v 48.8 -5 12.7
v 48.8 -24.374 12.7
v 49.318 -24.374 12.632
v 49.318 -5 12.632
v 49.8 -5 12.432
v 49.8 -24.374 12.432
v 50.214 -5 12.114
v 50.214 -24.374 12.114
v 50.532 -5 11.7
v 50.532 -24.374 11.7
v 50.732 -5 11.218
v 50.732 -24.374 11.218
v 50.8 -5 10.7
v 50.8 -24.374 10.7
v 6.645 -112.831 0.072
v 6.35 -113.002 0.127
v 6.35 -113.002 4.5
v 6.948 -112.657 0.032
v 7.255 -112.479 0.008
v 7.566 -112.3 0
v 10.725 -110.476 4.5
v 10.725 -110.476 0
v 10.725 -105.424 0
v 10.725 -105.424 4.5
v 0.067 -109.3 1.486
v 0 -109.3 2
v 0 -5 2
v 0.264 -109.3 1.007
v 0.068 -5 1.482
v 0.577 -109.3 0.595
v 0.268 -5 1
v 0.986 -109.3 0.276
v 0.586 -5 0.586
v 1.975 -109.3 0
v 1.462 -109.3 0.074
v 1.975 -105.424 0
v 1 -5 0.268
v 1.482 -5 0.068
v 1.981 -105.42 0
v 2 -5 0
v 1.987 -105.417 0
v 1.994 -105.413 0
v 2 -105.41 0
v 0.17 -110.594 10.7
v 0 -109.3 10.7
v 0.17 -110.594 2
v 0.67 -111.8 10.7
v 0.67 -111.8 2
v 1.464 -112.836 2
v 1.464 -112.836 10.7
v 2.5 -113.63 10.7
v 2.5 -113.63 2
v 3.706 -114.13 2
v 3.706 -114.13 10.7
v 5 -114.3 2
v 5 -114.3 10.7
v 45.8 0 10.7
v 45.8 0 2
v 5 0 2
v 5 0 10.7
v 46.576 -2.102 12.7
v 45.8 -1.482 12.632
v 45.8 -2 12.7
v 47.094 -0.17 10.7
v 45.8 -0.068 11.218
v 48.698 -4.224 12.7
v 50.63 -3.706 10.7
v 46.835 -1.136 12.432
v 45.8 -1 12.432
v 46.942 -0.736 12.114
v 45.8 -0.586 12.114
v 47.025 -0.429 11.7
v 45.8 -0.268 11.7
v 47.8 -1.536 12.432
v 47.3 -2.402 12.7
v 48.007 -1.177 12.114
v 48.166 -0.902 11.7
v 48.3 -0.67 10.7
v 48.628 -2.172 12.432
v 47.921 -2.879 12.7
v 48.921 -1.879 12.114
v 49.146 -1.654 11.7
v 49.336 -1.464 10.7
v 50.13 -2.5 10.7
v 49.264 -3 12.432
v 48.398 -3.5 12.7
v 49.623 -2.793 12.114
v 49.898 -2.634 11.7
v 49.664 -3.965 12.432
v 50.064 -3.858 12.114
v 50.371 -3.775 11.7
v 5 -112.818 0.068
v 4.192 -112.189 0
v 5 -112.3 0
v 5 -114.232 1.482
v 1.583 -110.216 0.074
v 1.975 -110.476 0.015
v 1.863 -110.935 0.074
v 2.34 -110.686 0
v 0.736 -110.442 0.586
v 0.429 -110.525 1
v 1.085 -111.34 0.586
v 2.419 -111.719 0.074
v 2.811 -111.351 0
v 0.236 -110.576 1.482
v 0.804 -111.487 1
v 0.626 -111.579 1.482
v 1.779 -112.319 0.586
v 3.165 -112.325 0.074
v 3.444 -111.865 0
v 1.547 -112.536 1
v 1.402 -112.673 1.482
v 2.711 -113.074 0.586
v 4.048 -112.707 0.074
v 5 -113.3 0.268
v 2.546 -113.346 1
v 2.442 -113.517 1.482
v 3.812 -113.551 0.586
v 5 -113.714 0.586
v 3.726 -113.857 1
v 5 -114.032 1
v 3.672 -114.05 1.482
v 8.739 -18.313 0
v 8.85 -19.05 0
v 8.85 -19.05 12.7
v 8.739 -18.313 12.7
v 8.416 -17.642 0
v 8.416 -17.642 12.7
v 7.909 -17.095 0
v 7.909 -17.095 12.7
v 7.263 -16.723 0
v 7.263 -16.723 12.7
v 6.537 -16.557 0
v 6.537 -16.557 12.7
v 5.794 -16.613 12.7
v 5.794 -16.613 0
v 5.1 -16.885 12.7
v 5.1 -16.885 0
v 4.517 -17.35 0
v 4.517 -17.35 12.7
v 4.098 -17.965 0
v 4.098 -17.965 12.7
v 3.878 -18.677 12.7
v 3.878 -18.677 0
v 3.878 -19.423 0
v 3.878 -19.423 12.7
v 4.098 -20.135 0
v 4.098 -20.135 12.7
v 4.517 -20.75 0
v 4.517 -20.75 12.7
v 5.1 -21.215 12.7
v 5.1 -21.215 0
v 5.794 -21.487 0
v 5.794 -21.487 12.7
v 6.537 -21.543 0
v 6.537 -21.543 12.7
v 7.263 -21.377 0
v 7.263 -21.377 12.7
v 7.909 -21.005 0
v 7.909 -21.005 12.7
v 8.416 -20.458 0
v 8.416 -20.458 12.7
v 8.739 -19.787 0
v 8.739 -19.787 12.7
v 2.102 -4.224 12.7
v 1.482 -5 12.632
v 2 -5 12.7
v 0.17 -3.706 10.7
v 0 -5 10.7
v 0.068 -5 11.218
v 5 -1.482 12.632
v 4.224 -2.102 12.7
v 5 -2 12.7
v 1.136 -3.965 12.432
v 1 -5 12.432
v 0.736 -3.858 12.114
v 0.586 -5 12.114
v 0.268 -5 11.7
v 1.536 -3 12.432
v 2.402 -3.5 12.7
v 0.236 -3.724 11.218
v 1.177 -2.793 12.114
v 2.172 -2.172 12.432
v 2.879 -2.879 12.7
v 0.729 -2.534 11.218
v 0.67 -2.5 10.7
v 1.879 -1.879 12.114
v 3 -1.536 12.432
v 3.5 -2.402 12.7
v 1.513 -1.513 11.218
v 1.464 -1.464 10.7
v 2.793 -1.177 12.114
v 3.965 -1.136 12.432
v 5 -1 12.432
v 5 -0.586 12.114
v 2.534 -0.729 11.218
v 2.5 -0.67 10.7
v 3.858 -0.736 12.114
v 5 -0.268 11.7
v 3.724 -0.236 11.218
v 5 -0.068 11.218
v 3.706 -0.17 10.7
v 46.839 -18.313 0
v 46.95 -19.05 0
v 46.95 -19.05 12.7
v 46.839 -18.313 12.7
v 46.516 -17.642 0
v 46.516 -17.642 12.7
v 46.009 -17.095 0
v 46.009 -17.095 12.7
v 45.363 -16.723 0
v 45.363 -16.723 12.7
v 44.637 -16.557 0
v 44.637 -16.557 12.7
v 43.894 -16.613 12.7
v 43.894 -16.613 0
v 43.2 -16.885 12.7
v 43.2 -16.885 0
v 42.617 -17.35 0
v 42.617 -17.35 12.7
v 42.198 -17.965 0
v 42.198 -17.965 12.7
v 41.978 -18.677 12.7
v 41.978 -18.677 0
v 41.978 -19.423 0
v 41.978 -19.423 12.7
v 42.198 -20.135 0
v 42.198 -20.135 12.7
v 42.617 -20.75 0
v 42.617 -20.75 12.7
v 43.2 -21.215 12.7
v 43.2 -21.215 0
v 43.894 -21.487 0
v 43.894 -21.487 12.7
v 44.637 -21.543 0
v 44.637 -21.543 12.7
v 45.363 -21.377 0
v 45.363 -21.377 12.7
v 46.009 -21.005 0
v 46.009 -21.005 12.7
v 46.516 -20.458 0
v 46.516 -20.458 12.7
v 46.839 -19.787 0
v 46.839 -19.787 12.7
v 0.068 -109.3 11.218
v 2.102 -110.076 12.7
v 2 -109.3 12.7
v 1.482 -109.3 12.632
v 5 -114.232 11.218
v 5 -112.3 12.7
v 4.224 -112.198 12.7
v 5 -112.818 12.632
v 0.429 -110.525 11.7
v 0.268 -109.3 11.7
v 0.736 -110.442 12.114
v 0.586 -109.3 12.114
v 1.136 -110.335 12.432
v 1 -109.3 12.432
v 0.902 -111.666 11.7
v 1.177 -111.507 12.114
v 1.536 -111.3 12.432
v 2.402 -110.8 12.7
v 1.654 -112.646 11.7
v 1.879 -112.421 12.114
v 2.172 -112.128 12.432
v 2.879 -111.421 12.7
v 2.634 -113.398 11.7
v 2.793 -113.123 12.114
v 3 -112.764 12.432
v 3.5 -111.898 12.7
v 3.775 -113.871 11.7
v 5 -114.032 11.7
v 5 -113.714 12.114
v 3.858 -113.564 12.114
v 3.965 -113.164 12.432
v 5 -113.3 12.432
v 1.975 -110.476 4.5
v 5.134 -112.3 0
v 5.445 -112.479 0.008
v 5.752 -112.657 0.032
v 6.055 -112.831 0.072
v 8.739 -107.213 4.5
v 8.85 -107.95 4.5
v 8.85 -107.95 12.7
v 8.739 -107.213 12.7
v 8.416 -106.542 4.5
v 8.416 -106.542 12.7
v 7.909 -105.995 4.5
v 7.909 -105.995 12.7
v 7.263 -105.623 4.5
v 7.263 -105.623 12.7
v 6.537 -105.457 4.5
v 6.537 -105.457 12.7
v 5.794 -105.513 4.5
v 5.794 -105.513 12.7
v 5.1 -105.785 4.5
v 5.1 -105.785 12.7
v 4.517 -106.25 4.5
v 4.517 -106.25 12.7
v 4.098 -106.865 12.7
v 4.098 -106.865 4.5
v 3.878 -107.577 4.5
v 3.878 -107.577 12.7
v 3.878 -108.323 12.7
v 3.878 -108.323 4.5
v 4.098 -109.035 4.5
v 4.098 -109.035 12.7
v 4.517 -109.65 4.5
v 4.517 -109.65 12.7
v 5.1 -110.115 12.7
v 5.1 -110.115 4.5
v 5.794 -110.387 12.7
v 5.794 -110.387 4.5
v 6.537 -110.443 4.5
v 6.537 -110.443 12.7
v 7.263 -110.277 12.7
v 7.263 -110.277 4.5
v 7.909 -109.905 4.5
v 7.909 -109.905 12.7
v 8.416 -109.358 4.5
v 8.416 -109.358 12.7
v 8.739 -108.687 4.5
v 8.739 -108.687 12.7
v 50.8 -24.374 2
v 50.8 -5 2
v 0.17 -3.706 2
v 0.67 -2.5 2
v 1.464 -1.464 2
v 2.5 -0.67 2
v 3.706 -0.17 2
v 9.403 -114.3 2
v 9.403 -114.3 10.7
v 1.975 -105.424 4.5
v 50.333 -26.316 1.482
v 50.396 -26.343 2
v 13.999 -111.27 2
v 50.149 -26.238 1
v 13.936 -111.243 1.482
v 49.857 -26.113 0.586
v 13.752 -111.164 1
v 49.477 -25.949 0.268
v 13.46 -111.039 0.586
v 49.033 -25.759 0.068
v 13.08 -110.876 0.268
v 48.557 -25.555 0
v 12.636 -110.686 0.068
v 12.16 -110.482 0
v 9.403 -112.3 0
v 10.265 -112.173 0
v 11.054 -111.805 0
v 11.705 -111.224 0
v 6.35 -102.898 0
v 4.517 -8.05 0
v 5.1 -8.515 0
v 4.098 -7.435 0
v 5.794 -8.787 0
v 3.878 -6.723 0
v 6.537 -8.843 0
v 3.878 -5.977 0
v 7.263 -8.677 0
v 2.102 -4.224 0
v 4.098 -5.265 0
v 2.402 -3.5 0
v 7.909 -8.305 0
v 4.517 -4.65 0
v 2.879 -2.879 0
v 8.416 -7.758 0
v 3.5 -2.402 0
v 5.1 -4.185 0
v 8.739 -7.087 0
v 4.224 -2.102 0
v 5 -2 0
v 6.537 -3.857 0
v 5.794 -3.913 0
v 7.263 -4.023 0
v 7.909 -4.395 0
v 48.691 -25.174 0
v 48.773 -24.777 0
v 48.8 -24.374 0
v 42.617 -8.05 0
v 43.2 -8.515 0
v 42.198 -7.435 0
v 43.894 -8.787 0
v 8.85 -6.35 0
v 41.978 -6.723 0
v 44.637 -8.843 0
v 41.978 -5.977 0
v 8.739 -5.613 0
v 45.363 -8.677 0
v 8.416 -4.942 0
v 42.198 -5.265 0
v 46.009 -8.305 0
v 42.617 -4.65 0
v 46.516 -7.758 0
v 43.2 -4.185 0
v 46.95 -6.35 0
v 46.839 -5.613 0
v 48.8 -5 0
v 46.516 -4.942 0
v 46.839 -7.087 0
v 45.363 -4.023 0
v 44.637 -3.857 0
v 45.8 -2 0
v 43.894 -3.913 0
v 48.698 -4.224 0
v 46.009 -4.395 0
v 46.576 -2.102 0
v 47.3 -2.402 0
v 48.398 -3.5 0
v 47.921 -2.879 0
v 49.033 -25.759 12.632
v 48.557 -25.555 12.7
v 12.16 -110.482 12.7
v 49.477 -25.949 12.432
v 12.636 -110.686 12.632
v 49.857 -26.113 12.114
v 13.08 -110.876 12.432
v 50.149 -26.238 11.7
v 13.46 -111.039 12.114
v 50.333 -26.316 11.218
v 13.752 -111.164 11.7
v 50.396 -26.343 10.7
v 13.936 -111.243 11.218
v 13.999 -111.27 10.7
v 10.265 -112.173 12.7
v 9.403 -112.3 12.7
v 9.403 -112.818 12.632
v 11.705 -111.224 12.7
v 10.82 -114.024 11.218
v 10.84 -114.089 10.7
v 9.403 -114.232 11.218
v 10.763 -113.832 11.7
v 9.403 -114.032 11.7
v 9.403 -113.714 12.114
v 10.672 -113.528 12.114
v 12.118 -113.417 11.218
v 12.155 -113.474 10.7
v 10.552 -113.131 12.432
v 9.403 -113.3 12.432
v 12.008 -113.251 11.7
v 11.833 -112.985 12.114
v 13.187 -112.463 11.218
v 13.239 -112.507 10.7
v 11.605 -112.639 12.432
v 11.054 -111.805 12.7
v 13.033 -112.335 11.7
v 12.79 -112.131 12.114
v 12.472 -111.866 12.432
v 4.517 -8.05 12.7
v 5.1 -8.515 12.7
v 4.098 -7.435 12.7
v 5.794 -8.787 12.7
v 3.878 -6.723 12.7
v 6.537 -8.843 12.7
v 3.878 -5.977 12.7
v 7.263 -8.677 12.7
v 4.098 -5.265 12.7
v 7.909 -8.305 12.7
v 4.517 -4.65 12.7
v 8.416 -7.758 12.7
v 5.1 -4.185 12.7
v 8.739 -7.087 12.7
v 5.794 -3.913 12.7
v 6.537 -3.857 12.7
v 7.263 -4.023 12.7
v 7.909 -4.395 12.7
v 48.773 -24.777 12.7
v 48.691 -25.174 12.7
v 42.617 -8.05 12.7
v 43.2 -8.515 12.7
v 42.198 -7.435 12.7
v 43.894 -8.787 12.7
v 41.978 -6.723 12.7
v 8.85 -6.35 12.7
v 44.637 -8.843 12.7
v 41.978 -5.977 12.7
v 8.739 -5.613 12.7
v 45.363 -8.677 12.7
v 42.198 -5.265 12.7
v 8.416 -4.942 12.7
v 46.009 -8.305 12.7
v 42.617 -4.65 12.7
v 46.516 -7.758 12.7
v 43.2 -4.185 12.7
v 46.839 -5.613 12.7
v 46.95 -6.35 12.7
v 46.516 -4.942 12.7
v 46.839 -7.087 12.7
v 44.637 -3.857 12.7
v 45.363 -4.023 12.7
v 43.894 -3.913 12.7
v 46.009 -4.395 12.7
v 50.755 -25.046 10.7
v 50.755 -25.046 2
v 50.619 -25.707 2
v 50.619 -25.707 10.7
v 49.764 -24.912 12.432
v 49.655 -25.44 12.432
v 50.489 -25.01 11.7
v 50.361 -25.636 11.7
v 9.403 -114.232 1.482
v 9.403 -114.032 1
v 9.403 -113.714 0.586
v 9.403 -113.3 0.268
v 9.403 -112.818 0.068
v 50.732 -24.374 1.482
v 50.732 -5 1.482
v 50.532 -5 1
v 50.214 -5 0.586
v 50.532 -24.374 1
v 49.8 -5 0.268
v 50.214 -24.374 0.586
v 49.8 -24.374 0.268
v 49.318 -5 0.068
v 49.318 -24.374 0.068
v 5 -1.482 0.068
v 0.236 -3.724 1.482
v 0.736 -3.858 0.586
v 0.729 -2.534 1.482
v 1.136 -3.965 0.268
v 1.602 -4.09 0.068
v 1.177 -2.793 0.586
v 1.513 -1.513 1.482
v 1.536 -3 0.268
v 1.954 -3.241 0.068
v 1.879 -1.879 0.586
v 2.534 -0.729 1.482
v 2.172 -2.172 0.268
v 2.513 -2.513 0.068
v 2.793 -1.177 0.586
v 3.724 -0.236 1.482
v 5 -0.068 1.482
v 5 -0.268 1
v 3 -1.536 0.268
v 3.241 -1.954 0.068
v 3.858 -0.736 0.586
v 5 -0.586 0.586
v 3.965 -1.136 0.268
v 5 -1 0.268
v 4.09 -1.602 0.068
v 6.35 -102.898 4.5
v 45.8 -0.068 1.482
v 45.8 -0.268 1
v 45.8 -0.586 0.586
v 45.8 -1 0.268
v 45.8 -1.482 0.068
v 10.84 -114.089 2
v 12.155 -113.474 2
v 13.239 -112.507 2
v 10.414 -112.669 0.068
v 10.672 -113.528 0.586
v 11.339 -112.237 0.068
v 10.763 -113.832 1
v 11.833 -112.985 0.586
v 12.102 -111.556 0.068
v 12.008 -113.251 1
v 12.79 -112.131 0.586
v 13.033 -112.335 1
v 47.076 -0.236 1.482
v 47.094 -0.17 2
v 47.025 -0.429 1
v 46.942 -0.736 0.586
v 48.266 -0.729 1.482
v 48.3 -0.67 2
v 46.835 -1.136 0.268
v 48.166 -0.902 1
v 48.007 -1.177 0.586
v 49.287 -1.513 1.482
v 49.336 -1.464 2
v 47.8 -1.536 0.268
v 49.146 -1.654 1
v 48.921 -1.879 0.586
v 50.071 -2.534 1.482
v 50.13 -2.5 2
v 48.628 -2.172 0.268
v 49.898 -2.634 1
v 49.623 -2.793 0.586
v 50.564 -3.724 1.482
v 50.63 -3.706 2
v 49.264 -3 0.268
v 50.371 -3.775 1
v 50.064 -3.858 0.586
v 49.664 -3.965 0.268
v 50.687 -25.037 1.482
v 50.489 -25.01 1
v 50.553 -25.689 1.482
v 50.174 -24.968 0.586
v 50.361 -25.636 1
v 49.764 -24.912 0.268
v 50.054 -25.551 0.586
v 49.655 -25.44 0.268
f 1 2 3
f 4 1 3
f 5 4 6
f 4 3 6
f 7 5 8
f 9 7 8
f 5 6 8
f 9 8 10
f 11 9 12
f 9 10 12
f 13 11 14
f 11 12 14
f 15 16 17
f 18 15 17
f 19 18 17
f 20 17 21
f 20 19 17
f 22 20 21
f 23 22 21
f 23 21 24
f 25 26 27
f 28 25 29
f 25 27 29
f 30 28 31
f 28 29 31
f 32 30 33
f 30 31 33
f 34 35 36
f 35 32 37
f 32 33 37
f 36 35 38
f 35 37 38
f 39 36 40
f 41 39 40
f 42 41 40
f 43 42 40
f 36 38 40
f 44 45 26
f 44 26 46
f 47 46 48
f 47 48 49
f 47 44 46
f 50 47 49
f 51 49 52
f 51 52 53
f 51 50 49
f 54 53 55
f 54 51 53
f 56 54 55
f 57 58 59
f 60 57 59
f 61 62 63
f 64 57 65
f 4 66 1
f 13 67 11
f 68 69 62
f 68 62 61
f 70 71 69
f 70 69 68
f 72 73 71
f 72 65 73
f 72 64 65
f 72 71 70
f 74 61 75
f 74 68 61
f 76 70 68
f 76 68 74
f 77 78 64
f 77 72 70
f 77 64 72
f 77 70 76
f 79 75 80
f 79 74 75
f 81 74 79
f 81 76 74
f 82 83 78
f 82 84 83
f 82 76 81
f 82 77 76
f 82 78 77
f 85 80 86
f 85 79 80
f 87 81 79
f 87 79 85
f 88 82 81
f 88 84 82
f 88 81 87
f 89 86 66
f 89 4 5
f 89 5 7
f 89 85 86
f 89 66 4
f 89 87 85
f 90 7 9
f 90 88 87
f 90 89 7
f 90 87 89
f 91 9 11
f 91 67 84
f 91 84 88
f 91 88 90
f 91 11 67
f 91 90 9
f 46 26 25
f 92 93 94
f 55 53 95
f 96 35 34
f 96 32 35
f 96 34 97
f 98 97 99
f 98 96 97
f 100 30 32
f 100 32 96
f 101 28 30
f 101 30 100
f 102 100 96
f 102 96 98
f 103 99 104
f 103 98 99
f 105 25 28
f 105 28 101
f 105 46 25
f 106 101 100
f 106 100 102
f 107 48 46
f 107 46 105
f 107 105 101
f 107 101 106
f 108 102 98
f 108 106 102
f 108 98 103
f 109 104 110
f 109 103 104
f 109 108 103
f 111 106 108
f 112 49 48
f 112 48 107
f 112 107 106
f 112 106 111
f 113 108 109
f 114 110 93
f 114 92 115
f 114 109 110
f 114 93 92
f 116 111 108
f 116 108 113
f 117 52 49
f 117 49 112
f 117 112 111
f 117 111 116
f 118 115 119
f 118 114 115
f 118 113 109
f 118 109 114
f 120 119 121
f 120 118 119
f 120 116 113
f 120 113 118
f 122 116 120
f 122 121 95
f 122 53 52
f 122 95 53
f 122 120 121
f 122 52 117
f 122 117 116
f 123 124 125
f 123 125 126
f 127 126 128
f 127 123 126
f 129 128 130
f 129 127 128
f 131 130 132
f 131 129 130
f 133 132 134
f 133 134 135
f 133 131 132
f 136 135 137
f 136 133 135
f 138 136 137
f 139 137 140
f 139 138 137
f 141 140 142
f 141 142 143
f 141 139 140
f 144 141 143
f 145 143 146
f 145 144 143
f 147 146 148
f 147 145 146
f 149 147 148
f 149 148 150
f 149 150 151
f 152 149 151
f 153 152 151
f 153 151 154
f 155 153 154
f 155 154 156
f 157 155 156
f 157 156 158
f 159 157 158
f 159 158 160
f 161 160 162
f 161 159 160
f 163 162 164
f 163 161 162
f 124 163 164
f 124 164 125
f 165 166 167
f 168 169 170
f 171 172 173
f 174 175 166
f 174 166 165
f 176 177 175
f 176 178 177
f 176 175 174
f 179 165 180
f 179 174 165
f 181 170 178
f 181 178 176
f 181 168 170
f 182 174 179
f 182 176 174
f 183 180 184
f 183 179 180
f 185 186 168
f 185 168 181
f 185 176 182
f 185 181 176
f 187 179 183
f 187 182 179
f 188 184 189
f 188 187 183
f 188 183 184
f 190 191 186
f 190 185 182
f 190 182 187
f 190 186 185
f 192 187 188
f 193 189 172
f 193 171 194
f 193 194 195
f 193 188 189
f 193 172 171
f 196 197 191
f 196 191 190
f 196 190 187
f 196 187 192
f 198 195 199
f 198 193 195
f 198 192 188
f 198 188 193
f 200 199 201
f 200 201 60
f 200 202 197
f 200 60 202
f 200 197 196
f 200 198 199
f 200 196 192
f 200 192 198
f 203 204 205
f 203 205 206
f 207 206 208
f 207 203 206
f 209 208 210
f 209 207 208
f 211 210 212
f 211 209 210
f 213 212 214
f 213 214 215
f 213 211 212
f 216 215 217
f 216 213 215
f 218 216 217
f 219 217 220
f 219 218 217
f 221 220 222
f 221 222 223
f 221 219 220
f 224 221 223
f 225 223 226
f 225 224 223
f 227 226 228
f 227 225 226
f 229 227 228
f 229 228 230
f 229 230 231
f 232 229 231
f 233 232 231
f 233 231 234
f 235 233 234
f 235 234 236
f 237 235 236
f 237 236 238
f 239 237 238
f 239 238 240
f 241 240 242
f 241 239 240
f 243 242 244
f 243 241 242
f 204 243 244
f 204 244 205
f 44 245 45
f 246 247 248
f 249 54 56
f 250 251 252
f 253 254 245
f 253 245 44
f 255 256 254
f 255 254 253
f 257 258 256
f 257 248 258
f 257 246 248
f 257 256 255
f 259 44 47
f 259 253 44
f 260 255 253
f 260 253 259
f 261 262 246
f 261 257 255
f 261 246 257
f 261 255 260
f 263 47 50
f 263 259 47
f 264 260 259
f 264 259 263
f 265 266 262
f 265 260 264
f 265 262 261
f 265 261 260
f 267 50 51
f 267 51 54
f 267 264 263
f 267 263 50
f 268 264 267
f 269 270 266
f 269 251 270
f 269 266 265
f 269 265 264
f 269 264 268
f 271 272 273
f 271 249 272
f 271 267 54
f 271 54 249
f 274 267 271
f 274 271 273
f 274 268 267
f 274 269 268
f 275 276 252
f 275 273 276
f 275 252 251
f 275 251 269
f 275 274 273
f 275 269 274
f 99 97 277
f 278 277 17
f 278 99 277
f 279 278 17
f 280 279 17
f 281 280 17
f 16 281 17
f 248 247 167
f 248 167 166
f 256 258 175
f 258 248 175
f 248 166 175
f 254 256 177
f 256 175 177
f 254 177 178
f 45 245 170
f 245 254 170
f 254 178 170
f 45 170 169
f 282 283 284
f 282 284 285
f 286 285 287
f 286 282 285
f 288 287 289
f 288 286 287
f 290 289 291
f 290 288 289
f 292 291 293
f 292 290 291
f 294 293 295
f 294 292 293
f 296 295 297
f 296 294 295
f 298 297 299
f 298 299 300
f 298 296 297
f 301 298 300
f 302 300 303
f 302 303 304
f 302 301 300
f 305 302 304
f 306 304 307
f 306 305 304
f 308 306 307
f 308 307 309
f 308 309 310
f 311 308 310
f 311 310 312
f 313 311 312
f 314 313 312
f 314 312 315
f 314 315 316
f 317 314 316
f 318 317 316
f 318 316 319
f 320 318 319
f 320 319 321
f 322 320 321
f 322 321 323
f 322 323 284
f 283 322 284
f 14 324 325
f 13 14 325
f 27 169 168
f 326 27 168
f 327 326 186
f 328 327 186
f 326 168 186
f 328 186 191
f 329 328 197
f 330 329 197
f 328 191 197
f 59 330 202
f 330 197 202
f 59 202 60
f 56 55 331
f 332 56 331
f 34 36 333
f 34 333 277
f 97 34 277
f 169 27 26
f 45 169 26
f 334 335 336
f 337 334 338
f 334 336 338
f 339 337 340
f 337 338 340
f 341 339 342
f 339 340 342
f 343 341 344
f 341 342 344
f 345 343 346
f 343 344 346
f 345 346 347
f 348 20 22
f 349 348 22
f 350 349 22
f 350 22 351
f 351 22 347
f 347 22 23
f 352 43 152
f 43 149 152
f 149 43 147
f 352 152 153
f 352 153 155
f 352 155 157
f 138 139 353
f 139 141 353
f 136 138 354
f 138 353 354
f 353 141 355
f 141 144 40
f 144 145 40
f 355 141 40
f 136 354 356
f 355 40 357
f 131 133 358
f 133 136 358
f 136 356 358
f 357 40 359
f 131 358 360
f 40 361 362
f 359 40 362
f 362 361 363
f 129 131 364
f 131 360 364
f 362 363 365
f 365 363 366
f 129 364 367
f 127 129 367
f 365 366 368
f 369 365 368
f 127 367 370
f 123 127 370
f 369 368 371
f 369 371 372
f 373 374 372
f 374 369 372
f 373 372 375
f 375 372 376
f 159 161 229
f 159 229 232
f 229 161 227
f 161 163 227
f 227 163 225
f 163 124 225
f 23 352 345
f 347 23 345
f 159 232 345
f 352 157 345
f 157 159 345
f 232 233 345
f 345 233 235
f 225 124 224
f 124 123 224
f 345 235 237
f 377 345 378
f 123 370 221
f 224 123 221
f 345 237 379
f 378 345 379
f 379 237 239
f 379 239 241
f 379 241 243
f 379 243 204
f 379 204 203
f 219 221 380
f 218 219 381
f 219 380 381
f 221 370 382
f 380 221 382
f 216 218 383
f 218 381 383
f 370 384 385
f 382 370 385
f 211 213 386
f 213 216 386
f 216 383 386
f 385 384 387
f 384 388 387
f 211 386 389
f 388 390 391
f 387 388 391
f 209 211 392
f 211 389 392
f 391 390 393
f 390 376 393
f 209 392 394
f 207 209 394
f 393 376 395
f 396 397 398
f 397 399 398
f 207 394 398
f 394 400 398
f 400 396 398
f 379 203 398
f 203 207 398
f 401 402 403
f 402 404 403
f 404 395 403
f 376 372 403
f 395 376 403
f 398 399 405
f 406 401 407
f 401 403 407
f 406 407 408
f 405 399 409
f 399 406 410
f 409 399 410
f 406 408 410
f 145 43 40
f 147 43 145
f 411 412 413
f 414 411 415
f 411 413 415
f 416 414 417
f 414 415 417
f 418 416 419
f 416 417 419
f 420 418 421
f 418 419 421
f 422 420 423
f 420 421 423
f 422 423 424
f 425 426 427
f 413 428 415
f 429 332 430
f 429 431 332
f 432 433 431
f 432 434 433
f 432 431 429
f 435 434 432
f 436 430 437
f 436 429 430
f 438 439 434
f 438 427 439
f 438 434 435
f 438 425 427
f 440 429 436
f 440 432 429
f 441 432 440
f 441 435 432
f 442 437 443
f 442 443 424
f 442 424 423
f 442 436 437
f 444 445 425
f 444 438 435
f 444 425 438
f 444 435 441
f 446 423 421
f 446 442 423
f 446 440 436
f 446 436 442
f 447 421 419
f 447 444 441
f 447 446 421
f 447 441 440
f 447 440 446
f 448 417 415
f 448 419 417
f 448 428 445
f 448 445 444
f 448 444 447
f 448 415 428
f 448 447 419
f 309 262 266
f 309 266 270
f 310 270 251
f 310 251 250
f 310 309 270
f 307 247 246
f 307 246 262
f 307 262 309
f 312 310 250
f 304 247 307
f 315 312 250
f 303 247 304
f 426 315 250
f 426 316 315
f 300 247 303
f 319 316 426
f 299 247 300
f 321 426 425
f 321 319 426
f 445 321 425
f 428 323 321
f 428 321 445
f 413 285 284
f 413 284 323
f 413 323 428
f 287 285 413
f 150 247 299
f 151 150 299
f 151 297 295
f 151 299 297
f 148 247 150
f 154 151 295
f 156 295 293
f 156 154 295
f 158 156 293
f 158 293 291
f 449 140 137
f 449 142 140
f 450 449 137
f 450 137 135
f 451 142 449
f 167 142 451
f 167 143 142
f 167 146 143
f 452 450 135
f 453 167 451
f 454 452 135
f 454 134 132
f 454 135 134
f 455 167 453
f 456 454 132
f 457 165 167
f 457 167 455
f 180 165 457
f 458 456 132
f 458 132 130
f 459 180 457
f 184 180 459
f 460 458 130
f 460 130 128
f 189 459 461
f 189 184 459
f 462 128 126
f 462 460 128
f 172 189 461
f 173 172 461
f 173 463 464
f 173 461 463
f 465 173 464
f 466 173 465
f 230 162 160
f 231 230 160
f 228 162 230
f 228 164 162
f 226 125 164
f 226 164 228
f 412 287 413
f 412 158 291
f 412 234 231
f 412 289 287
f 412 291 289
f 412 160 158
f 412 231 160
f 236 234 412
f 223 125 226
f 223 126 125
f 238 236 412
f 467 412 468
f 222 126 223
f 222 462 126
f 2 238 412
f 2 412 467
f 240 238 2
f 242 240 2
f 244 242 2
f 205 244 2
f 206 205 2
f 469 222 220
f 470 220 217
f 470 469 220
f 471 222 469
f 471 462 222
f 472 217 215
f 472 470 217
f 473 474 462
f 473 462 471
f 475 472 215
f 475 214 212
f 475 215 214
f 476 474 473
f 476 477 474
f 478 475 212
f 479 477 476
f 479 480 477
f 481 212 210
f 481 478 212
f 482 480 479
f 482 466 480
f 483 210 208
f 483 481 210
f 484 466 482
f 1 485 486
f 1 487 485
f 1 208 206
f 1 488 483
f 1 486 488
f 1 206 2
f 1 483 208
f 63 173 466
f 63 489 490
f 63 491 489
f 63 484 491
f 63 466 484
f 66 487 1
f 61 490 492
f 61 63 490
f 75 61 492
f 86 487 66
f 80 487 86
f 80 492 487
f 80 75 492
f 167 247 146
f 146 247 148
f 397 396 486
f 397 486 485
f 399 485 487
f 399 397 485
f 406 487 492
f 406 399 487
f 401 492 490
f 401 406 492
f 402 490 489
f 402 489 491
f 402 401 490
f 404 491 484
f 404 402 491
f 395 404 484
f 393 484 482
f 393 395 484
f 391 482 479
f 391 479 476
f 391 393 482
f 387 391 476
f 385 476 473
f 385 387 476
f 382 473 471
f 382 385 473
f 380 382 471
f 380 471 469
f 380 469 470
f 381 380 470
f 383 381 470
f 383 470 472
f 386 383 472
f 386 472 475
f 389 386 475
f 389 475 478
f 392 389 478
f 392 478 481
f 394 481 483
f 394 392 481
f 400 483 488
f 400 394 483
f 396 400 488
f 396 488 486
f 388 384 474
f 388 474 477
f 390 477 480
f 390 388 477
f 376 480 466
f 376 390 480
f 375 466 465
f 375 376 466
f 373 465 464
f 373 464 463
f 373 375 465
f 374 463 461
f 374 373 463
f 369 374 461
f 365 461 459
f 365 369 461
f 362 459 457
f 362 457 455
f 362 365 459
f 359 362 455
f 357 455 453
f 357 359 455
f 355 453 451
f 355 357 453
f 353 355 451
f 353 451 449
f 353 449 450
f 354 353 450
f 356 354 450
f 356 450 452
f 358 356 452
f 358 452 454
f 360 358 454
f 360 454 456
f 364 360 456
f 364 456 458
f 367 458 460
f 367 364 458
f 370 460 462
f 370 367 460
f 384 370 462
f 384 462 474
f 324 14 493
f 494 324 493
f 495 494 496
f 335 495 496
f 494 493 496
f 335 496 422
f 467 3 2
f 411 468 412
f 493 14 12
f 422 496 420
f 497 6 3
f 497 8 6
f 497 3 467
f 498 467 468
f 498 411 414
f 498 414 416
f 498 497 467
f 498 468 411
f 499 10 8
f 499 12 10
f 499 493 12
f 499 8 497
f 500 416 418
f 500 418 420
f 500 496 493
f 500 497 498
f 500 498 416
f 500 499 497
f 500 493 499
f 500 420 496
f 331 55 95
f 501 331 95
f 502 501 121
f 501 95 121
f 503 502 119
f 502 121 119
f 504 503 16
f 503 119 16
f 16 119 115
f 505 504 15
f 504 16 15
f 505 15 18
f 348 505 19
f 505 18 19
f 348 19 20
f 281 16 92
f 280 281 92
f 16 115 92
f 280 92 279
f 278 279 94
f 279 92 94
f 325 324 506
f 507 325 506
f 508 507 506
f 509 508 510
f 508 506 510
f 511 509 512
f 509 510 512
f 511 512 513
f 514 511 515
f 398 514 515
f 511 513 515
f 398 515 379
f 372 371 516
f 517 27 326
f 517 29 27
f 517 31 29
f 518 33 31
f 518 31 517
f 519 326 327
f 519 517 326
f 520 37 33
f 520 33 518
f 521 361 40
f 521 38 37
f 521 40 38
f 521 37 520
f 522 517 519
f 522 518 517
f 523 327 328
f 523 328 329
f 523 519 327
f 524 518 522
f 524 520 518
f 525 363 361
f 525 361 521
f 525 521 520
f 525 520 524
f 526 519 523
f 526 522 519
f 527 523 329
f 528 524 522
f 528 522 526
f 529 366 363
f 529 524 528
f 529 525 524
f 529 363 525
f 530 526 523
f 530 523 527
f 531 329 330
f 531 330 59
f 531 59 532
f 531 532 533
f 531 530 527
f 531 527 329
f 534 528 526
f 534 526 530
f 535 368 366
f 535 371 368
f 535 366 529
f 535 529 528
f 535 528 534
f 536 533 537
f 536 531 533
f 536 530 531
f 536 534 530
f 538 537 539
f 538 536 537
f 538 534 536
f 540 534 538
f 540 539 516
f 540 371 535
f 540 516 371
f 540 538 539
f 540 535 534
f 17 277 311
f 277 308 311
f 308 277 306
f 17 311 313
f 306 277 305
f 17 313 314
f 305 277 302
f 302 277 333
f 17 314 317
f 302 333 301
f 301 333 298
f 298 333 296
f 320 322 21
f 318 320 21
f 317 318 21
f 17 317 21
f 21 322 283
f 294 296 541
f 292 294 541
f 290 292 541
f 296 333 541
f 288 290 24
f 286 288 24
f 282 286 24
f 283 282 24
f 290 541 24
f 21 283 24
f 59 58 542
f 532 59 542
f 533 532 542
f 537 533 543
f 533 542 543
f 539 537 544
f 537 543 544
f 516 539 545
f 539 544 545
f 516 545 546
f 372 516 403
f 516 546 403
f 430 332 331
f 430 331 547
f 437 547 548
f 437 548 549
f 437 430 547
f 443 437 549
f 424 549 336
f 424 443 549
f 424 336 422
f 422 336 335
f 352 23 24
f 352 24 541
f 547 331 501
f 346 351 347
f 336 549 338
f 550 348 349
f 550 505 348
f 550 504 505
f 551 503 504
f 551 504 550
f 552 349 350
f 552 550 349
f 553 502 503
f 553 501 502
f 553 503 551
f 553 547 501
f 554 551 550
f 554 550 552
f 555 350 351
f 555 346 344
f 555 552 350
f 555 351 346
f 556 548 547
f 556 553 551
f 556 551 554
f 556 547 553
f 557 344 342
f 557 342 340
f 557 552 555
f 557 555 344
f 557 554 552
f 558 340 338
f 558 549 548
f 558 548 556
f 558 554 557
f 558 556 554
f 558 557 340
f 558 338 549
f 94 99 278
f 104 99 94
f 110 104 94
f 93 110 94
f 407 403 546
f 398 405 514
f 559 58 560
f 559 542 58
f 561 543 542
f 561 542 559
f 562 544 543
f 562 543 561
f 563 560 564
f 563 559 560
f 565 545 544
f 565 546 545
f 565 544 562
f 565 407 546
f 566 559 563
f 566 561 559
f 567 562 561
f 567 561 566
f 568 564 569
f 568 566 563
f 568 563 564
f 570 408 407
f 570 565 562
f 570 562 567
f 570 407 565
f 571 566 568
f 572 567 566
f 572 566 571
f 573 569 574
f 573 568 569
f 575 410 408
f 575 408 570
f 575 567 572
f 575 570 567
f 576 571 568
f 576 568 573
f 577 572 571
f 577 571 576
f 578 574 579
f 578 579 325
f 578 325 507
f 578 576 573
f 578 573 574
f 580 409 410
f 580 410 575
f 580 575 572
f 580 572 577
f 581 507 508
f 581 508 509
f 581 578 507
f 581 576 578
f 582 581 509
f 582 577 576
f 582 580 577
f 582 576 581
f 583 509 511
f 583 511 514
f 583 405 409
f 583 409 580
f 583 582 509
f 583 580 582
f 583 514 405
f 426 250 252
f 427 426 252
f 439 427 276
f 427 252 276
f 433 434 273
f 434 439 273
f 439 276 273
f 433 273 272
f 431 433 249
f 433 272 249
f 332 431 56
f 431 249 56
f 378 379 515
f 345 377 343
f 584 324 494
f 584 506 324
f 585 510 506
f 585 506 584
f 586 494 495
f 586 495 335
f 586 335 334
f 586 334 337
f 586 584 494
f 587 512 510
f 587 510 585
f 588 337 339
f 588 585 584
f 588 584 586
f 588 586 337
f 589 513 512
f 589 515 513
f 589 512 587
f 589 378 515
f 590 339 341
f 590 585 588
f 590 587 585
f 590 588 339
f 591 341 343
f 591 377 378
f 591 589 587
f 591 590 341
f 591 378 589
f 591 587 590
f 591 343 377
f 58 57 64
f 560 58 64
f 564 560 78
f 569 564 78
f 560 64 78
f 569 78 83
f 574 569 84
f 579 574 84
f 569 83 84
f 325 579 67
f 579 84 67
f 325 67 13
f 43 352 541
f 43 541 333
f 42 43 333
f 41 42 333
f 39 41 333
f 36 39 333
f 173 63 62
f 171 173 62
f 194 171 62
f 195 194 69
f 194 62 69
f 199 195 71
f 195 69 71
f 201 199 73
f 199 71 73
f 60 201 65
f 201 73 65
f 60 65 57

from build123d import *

# Parameters (mm, degrees)
SKETCH1_R           = 2.5
BOSS_EXTRUDE1_DEPTH = 12.7
CUT_EXTRUDE1_START  = -12.7
CUT_EXTRUDE1_DEPTH  = 4.5
FILLET1_R           = 5
FILLET2_R           = 2


with BuildPart() as part:
    # Sketch1 → Boss-Extrude1 (new body)
    with BuildSketch(Plane.XY):
        Polygon((0, 0), (0, -114.3), (12.7, -114.3), (50.8, -25.4), (50.8, 0), align=None)
        with Locations((6.35, -6.35)):
            Circle(SKETCH1_R, mode=Mode.SUBTRACT)
        with Locations((6.35, -107.95)):
            Circle(SKETCH1_R, mode=Mode.SUBTRACT)
        with Locations((44.45, -6.35)):
            Circle(SKETCH1_R, mode=Mode.SUBTRACT)
        with Locations((44.45, -19.05)):
            Circle(SKETCH1_R, mode=Mode.SUBTRACT)
        with Locations((6.35, -19.05)):
            Circle(SKETCH1_R, mode=Mode.SUBTRACT)
    extrude(amount=BOSS_EXTRUDE1_DEPTH)

    # Sketch2 → Cut-Extrude1 (cut)
    with BuildSketch(Plane.XY.offset(12.7).offset(CUT_EXTRUDE1_START)):
        Polygon((6.35, -113.001814855), (10.725, -110.475907428), (10.725, -105.424092572), (6.35, -102.898185145), (1.975, -105.424092572), (1.975, -110.475907428), align=None)
    extrude(amount=CUT_EXTRUDE1_DEPTH, mode=Mode.SUBTRACT)

    # Fillet1
    fillet1_edges = [part.edges().sort_by_distance(p)[0] for p in [
        (50.8, 0, 6.35),
        (50.8, -25.4, 6.35),
        (12.7, -114.3, 6.35),
        (0, -114.3, 6.35),
        (0, 0, 6.35),
    ]]
    fillet(fillet1_edges, radius=FILLET1_R)

    # Fillet2
    # the kernel refuses this fillet: 2 mm, written as the material it takes off along each edge
    with BuildSketch(Plane(origin=(45.8, -24.37371149, 12.7), x_dir=(1, 0, 0), z_dir=(0, 1, 0))) as fillet2_piece_1:
        with BuildLine():
            CenterArc((5 - FILLET2_R, FILLET2_R), FILLET2_R, 270, 90)
            Line((5, FILLET2_R), (5, 0))
            Line((5, 0), (5 - FILLET2_R, 0))
        make_face()
    fillet2_piece_1_solid = revolve(axis=Axis((45.8, -24.37371149, 12.7), (0, 0, -1)), revolution_arc=23.198590514, mode=Mode.PRIVATE)
    with BuildSketch(Plane(origin=(13.99874436, -111.269596493, 12.7), x_dir=(-0.9191450300180581, 0.3939192985791675, 0), z_dir=(0.39391929857916747, 0.919145030018058, 0))) as fillet2_piece_2:
        with BuildLine():
            CenterArc((FILLET2_R, -FILLET2_R), FILLET2_R, 90, 90)
            Line((0, -FILLET2_R), (0, 0))
            Line((0, 0), (FILLET2_R, 0))
        make_face()
    fillet2_piece_2_solid = extrude(amount=92.397049145, mode=Mode.PRIVATE)
    with BuildSketch(Plane(origin=(9.40301921, -109.3, 12.7), x_dir=(0, -1, 0), z_dir=(-1, 0, 0))) as fillet2_piece_3:
        with BuildLine():
            CenterArc((5 - FILLET2_R, -FILLET2_R), FILLET2_R, 0, 90)
            Line((5, -FILLET2_R), (5, 0))
            Line((5, 0), (5 - FILLET2_R, 0))
        make_face()
    fillet2_piece_3_solid = revolve(axis=Axis((9.40301921, -109.3, 12.7), (0, 0, 1)), revolution_arc=66.801409486, mode=Mode.PRIVATE)
    with BuildSketch(Plane(origin=(5, -114.3, 12.7), x_dir=(0, 1, 0), z_dir=(1, 0, 0))) as fillet2_piece_4:
        with BuildLine():
            CenterArc((FILLET2_R, -FILLET2_R), FILLET2_R, 90, 90)
            Line((0, -FILLET2_R), (0, 0))
            Line((0, 0), (FILLET2_R, 0))
        make_face()
    fillet2_piece_4_solid = extrude(amount=4.40301921, mode=Mode.PRIVATE)
    with BuildSketch(Plane(origin=(5, -109.3, 12.7), x_dir=(-1, 0, 0), z_dir=(0, 1, 0))) as fillet2_piece_5:
        with BuildLine():
            CenterArc((5 - FILLET2_R, -FILLET2_R), FILLET2_R, 0, 90)
            Line((5 - FILLET2_R, 0), (5, 0))
            Line((5, 0), (5, -FILLET2_R))
        make_face()
    fillet2_piece_5_solid = revolve(axis=Axis((5, -109.3, 12.7), (0, 0, 1)), revolution_arc=90, mode=Mode.PRIVATE)
    with BuildSketch(Plane(origin=(0, -5, 12.7), x_dir=(0, 0, -1), z_dir=(0, -1, 0))) as fillet2_piece_6:
        with BuildLine():
            CenterArc((FILLET2_R, FILLET2_R), FILLET2_R, 180, 90)
            Line((0, FILLET2_R), (0, 0))
            Line((0, 0), (FILLET2_R, 0))
        make_face()
    fillet2_piece_6_solid = extrude(amount=104.3, mode=Mode.PRIVATE)
    with BuildSketch(Plane(origin=(5, -5, 12.7), x_dir=(-1, 0, 0), z_dir=(0, -1, 0))) as fillet2_piece_7:
        with BuildLine():
            CenterArc((5 - FILLET2_R, FILLET2_R), FILLET2_R, 270, 90)
            Line((5 - FILLET2_R, 0), (5, 0))
            Line((5, 0), (5, FILLET2_R))
        make_face()
    fillet2_piece_7_solid = revolve(axis=Axis((5, -5, 12.7), (0, 0, -1)), revolution_arc=90, mode=Mode.PRIVATE)
    with BuildSketch(Plane(origin=(45.8, 0, 12.7), x_dir=(0, -1, 0), z_dir=(-1, 0, 0))) as fillet2_piece_8:
        with BuildLine():
            CenterArc((FILLET2_R, -FILLET2_R), FILLET2_R, 90, 90)
            Line((0, -FILLET2_R), (0, 0))
            Line((0, 0), (FILLET2_R, 0))
        make_face()
    fillet2_piece_8_solid = extrude(amount=40.8, mode=Mode.PRIVATE)
    with BuildSketch(Plane(origin=(45.8, -5, 12.7), x_dir=(0, 1, 0), z_dir=(-1, 0, 0))) as fillet2_piece_9:
        with BuildLine():
            CenterArc((5 - FILLET2_R, FILLET2_R), FILLET2_R, 270, 90)
            Line((5, FILLET2_R), (5, 0))
            Line((5, 0), (5 - FILLET2_R, 0))
        make_face()
    fillet2_piece_9_solid = revolve(axis=Axis((45.8, -5, 12.7), (0, 0, -1)), revolution_arc=90, mode=Mode.PRIVATE)
    with BuildSketch(Plane(origin=(9.40301921, -109.3, 0), x_dir=(0, -1, 0), z_dir=(-1, 0, 0))) as fillet2_piece_10:
        with BuildLine():
            CenterArc((5 - FILLET2_R, FILLET2_R), FILLET2_R, 270, 90)
            Line((5, FILLET2_R), (5, 0))
            Line((5, 0), (5 - FILLET2_R, 0))
        make_face()
    fillet2_piece_10_solid = revolve(axis=Axis((9.40301921, -109.3, 0), (0, 0, 1)), revolution_arc=66.801409486, mode=Mode.PRIVATE)
    with BuildSketch(Plane(origin=(5, -114.3, 0), x_dir=(0, 1, 0), z_dir=(1, 0, 0))) as fillet2_piece_11:
        with BuildLine():
            CenterArc((FILLET2_R, FILLET2_R), FILLET2_R, 180, 90)
            Line((0, FILLET2_R), (0, 0))
            Line((0, 0), (FILLET2_R, 0))
        make_face()
    fillet2_piece_11_solid = extrude(amount=4.40301921, mode=Mode.PRIVATE)
    with BuildSketch(Plane(origin=(5, -109.3, 0), x_dir=(-1, 0, 0), z_dir=(0, 1, 0))) as fillet2_piece_12:
        with BuildLine():
            CenterArc((5 - FILLET2_R, FILLET2_R), FILLET2_R, 270, 90)
            Line((5, FILLET2_R), (5, 0))
            Line((5, 0), (5 - FILLET2_R, 0))
        make_face()
    fillet2_piece_12_solid = revolve(axis=Axis((5, -109.3, 0), (0, 0, 1)), revolution_arc=90, mode=Mode.PRIVATE)
    with BuildSketch(Plane(origin=(0, -5, 0), x_dir=(0, 0, 1), z_dir=(0, -1, 0))) as fillet2_piece_13:
        with BuildLine():
            CenterArc((FILLET2_R, -FILLET2_R), FILLET2_R, 90, 90)
            Line((0, -FILLET2_R), (0, 0))
            Line((0, 0), (FILLET2_R, 0))
        make_face()
    fillet2_piece_13_solid = extrude(amount=104.3, mode=Mode.PRIVATE)
    with BuildSketch(Plane(origin=(5, -5, 0), x_dir=(-1, 0, 0), z_dir=(0, -1, 0))) as fillet2_piece_14:
        with BuildLine():
            CenterArc((5 - FILLET2_R, -FILLET2_R), FILLET2_R, 0, 90)
            Line((5, -FILLET2_R), (5, 0))
            Line((5, 0), (5 - FILLET2_R, 0))
        make_face()
    fillet2_piece_14_solid = revolve(axis=Axis((5, -5, 0), (0, 0, -1)), revolution_arc=90, mode=Mode.PRIVATE)
    with BuildSketch(Plane(origin=(45.8, 0, 0), x_dir=(0, -1, 0), z_dir=(-1, 0, 0))) as fillet2_piece_15:
        with BuildLine():
            CenterArc((FILLET2_R, FILLET2_R), FILLET2_R, 180, 90)
            Line((0, FILLET2_R), (0, 0))
            Line((0, 0), (FILLET2_R, 0))
        make_face()
    fillet2_piece_15_solid = extrude(amount=40.8, mode=Mode.PRIVATE)
    with BuildSketch(Plane(origin=(45.8, -5, 0), x_dir=(0, 1, 0), z_dir=(-1, 0, 0))) as fillet2_piece_16:
        with BuildLine():
            CenterArc((5 - FILLET2_R, -FILLET2_R), FILLET2_R, 0, 90)
            Line((5, -FILLET2_R), (5, 0))
            Line((5, 0), (5 - FILLET2_R, 0))
        make_face()
    fillet2_piece_16_solid = revolve(axis=Axis((45.8, -5, 0), (0, 0, -1)), revolution_arc=90, mode=Mode.PRIVATE)
    with BuildSketch(Plane(origin=(50.8, -24.37371149, 0), x_dir=(-1, 0, 0), z_dir=(0, 1, 0))) as fillet2_piece_17:
        with BuildLine():
            CenterArc((FILLET2_R, FILLET2_R), FILLET2_R, 180, 90)
            Line((0, FILLET2_R), (0, 0))
            Line((0, 0), (FILLET2_R, 0))
        make_face()
    fillet2_piece_17_solid = extrude(amount=19.37371149, mode=Mode.PRIVATE)
    with BuildSketch(Plane(origin=(45.8, -24.37371149, 0), x_dir=(1, 0, 0), z_dir=(0, 1, 0))) as fillet2_piece_18:
        with BuildLine():
            CenterArc((5 - FILLET2_R, -FILLET2_R), FILLET2_R, 0, 90)
            Line((5, -FILLET2_R), (5, 0))
            Line((5, 0), (5 - FILLET2_R, 0))
        make_face()
    fillet2_piece_18_solid = revolve(axis=Axis((45.8, -24.37371149, 0), (0, 0, -1)), revolution_arc=23.198590514, mode=Mode.PRIVATE)
    with BuildSketch(Plane(origin=(50.8, -24.37371149, 12.7), x_dir=(-1, 0, 0), z_dir=(0, 1, 0))) as fillet2_piece_19:
        with BuildLine():
            CenterArc((FILLET2_R, -FILLET2_R), FILLET2_R, 90, 90)
            Line((0, -FILLET2_R), (0, 0))
            Line((0, 0), (FILLET2_R, 0))
        make_face()
    fillet2_piece_19_solid = extrude(amount=19.37371149, mode=Mode.PRIVATE)
    with BuildSketch(Plane(origin=(13.99874436, -111.269596493, 0), x_dir=(-0.9191450300180581, 0.3939192985791675, 0), z_dir=(0.39391929857916747, 0.919145030018058, 0))) as fillet2_piece_20:
        with BuildLine():
            CenterArc((FILLET2_R, FILLET2_R), FILLET2_R, 180, 90)
            Line((0, FILLET2_R), (0, 0))
            Line((0, 0), (FILLET2_R, 0))
        make_face()
    fillet2_piece_20_solid = extrude(amount=92.397049145, mode=Mode.PRIVATE)
    add([fillet2_piece_1_solid, fillet2_piece_2_solid, fillet2_piece_3_solid, fillet2_piece_4_solid, fillet2_piece_5_solid, fillet2_piece_6_solid, fillet2_piece_7_solid, fillet2_piece_8_solid, fillet2_piece_9_solid, fillet2_piece_10_solid, fillet2_piece_11_solid, fillet2_piece_12_solid, fillet2_piece_13_solid, fillet2_piece_14_solid, fillet2_piece_15_solid, fillet2_piece_16_solid, fillet2_piece_17_solid, fillet2_piece_18_solid, fillet2_piece_19_solid, fillet2_piece_20_solid], mode=Mode.SUBTRACT)


solid = part.part
